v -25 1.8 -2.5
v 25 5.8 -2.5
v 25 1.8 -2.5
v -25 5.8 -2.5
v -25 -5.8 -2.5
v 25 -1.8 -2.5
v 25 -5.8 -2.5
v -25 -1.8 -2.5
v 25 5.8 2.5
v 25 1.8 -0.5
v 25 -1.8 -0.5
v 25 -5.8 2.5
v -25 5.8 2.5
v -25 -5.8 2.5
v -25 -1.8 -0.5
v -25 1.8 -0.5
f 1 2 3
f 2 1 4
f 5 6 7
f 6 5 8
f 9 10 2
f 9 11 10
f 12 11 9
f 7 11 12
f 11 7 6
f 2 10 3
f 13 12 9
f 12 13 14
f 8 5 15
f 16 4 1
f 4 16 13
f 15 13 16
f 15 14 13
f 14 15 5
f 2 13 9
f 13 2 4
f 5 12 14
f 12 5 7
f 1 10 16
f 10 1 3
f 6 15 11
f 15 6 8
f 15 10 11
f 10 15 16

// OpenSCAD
// Print-ready: a short coupon of the button-lead groove, to test the lip fit
// before committing the whole electronics deck (docs/housing_decisions.md,
// 2026-10-11). A 50mm strip of deck-thickness stock with the groove and a few
// retention lips. Try pressing the two button leads in and out.
//   openscad -o groove_coupon.stl print_groove_coupon.scad
use <dial_unit_housing.scad>
groove_coupon();
